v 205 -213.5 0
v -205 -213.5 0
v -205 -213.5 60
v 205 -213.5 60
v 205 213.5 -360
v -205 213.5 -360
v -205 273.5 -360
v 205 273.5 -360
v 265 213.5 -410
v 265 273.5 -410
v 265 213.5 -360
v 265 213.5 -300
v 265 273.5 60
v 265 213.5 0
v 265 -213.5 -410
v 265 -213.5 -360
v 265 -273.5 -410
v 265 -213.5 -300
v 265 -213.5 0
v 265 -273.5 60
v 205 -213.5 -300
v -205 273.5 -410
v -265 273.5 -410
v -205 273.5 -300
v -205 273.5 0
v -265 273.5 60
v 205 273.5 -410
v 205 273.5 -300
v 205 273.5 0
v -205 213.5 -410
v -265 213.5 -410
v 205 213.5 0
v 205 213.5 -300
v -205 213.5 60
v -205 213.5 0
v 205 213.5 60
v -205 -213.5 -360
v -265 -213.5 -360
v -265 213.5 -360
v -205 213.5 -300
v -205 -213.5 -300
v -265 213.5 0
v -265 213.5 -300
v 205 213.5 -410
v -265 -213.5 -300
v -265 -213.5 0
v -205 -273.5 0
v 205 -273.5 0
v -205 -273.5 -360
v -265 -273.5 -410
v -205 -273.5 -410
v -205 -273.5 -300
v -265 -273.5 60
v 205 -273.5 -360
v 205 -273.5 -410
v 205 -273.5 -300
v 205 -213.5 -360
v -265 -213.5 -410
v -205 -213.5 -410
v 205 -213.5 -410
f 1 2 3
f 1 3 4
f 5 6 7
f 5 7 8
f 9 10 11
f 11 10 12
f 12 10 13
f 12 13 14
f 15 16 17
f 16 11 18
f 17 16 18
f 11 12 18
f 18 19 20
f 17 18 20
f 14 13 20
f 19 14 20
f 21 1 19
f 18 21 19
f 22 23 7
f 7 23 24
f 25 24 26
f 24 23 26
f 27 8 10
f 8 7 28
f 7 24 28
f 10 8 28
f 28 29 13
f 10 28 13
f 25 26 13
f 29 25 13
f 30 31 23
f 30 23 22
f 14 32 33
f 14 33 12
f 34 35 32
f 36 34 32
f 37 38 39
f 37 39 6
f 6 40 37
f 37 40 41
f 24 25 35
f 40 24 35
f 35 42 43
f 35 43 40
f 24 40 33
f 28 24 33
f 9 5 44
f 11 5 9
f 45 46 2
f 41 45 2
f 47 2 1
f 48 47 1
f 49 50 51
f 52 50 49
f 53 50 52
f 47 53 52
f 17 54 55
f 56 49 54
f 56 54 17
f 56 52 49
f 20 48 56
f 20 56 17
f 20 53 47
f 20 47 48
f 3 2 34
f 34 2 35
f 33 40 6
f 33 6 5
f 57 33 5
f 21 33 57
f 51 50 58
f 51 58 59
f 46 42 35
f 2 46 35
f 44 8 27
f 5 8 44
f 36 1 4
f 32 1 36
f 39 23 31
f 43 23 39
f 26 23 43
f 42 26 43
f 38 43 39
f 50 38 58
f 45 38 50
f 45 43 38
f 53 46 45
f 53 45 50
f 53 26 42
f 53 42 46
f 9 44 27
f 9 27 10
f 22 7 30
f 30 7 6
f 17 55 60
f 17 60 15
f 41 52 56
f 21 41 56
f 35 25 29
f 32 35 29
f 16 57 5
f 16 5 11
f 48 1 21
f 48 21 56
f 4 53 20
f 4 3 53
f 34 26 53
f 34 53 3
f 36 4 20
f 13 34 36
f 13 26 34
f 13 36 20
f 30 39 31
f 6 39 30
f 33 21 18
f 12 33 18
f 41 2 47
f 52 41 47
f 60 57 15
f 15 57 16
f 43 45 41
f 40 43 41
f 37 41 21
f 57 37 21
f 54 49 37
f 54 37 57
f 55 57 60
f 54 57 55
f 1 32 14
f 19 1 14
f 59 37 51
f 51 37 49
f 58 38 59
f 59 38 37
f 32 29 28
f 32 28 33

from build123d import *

# Parameters (mm, degrees)
F0_W     = 530
F0_H     = 547
F0_W_2   = 410
F0_H_2   = 427
F1_DEPTH = 60
F2_W     = 60
F2_H     = 60
F3_DEPTH = 300
F4_W     = 530
F4_H     = 547
F4_W_2   = 410
F4_H_2   = 427
F5_DEPTH = 60
F6_W     = 60
F6_H     = 60
F7_DEPTH = 50


with BuildPart() as f1:
    # F0 (on Top) → F1 (new body)
    with BuildSketch(Plane.XY):
        Rectangle(F0_W, F0_H)
        Rectangle(F0_W_2, F0_H_2, mode=Mode.SUBTRACT)
    extrude(amount=F1_DEPTH)

    # F2 (on face) → F3 (join)
    with BuildSketch(Plane(origin=(0, 0, 0), x_dir=(1, 0, 0), z_dir=(0, 0, -1))):
        with Locations((-235, 243.5)):
            Rectangle(F2_W, F2_H)
        with Locations((235, 243.5)):
            Rectangle(F2_W, F2_H)
        with Locations((-235, -243.5)):
            Rectangle(F2_W, F2_H)
        with Locations((235, -243.5)):
            Rectangle(F2_W, F2_H)
    extrude(amount=F3_DEPTH)

    # F4 (on face) → F5 (join)
    with BuildSketch(Plane(origin=(0, 0, -300), x_dir=(1, 0, 0), z_dir=(0, 0, -1))):
        Rectangle(F4_W, F4_H)
        Rectangle(F4_W_2, F4_H_2, mode=Mode.SUBTRACT)
    extrude(amount=F5_DEPTH)

    # F6 (on face) → F7 (join)
    with BuildSketch(Plane(origin=(0, 0, -360), x_dir=(1, 0, 0), z_dir=(0, 0, -1))):
        with Locations((-235, 243.5)):
            Rectangle(F6_W, F6_H)
        with Locations((235, 243.5)):
            Rectangle(F6_W, F6_H)
        with Locations((-235, -243.5)):
            Rectangle(F6_W, F6_H)
        with Locations((235, -243.5)):
            Rectangle(F6_W, F6_H)
    extrude(amount=F7_DEPTH)


solid = f1.part
